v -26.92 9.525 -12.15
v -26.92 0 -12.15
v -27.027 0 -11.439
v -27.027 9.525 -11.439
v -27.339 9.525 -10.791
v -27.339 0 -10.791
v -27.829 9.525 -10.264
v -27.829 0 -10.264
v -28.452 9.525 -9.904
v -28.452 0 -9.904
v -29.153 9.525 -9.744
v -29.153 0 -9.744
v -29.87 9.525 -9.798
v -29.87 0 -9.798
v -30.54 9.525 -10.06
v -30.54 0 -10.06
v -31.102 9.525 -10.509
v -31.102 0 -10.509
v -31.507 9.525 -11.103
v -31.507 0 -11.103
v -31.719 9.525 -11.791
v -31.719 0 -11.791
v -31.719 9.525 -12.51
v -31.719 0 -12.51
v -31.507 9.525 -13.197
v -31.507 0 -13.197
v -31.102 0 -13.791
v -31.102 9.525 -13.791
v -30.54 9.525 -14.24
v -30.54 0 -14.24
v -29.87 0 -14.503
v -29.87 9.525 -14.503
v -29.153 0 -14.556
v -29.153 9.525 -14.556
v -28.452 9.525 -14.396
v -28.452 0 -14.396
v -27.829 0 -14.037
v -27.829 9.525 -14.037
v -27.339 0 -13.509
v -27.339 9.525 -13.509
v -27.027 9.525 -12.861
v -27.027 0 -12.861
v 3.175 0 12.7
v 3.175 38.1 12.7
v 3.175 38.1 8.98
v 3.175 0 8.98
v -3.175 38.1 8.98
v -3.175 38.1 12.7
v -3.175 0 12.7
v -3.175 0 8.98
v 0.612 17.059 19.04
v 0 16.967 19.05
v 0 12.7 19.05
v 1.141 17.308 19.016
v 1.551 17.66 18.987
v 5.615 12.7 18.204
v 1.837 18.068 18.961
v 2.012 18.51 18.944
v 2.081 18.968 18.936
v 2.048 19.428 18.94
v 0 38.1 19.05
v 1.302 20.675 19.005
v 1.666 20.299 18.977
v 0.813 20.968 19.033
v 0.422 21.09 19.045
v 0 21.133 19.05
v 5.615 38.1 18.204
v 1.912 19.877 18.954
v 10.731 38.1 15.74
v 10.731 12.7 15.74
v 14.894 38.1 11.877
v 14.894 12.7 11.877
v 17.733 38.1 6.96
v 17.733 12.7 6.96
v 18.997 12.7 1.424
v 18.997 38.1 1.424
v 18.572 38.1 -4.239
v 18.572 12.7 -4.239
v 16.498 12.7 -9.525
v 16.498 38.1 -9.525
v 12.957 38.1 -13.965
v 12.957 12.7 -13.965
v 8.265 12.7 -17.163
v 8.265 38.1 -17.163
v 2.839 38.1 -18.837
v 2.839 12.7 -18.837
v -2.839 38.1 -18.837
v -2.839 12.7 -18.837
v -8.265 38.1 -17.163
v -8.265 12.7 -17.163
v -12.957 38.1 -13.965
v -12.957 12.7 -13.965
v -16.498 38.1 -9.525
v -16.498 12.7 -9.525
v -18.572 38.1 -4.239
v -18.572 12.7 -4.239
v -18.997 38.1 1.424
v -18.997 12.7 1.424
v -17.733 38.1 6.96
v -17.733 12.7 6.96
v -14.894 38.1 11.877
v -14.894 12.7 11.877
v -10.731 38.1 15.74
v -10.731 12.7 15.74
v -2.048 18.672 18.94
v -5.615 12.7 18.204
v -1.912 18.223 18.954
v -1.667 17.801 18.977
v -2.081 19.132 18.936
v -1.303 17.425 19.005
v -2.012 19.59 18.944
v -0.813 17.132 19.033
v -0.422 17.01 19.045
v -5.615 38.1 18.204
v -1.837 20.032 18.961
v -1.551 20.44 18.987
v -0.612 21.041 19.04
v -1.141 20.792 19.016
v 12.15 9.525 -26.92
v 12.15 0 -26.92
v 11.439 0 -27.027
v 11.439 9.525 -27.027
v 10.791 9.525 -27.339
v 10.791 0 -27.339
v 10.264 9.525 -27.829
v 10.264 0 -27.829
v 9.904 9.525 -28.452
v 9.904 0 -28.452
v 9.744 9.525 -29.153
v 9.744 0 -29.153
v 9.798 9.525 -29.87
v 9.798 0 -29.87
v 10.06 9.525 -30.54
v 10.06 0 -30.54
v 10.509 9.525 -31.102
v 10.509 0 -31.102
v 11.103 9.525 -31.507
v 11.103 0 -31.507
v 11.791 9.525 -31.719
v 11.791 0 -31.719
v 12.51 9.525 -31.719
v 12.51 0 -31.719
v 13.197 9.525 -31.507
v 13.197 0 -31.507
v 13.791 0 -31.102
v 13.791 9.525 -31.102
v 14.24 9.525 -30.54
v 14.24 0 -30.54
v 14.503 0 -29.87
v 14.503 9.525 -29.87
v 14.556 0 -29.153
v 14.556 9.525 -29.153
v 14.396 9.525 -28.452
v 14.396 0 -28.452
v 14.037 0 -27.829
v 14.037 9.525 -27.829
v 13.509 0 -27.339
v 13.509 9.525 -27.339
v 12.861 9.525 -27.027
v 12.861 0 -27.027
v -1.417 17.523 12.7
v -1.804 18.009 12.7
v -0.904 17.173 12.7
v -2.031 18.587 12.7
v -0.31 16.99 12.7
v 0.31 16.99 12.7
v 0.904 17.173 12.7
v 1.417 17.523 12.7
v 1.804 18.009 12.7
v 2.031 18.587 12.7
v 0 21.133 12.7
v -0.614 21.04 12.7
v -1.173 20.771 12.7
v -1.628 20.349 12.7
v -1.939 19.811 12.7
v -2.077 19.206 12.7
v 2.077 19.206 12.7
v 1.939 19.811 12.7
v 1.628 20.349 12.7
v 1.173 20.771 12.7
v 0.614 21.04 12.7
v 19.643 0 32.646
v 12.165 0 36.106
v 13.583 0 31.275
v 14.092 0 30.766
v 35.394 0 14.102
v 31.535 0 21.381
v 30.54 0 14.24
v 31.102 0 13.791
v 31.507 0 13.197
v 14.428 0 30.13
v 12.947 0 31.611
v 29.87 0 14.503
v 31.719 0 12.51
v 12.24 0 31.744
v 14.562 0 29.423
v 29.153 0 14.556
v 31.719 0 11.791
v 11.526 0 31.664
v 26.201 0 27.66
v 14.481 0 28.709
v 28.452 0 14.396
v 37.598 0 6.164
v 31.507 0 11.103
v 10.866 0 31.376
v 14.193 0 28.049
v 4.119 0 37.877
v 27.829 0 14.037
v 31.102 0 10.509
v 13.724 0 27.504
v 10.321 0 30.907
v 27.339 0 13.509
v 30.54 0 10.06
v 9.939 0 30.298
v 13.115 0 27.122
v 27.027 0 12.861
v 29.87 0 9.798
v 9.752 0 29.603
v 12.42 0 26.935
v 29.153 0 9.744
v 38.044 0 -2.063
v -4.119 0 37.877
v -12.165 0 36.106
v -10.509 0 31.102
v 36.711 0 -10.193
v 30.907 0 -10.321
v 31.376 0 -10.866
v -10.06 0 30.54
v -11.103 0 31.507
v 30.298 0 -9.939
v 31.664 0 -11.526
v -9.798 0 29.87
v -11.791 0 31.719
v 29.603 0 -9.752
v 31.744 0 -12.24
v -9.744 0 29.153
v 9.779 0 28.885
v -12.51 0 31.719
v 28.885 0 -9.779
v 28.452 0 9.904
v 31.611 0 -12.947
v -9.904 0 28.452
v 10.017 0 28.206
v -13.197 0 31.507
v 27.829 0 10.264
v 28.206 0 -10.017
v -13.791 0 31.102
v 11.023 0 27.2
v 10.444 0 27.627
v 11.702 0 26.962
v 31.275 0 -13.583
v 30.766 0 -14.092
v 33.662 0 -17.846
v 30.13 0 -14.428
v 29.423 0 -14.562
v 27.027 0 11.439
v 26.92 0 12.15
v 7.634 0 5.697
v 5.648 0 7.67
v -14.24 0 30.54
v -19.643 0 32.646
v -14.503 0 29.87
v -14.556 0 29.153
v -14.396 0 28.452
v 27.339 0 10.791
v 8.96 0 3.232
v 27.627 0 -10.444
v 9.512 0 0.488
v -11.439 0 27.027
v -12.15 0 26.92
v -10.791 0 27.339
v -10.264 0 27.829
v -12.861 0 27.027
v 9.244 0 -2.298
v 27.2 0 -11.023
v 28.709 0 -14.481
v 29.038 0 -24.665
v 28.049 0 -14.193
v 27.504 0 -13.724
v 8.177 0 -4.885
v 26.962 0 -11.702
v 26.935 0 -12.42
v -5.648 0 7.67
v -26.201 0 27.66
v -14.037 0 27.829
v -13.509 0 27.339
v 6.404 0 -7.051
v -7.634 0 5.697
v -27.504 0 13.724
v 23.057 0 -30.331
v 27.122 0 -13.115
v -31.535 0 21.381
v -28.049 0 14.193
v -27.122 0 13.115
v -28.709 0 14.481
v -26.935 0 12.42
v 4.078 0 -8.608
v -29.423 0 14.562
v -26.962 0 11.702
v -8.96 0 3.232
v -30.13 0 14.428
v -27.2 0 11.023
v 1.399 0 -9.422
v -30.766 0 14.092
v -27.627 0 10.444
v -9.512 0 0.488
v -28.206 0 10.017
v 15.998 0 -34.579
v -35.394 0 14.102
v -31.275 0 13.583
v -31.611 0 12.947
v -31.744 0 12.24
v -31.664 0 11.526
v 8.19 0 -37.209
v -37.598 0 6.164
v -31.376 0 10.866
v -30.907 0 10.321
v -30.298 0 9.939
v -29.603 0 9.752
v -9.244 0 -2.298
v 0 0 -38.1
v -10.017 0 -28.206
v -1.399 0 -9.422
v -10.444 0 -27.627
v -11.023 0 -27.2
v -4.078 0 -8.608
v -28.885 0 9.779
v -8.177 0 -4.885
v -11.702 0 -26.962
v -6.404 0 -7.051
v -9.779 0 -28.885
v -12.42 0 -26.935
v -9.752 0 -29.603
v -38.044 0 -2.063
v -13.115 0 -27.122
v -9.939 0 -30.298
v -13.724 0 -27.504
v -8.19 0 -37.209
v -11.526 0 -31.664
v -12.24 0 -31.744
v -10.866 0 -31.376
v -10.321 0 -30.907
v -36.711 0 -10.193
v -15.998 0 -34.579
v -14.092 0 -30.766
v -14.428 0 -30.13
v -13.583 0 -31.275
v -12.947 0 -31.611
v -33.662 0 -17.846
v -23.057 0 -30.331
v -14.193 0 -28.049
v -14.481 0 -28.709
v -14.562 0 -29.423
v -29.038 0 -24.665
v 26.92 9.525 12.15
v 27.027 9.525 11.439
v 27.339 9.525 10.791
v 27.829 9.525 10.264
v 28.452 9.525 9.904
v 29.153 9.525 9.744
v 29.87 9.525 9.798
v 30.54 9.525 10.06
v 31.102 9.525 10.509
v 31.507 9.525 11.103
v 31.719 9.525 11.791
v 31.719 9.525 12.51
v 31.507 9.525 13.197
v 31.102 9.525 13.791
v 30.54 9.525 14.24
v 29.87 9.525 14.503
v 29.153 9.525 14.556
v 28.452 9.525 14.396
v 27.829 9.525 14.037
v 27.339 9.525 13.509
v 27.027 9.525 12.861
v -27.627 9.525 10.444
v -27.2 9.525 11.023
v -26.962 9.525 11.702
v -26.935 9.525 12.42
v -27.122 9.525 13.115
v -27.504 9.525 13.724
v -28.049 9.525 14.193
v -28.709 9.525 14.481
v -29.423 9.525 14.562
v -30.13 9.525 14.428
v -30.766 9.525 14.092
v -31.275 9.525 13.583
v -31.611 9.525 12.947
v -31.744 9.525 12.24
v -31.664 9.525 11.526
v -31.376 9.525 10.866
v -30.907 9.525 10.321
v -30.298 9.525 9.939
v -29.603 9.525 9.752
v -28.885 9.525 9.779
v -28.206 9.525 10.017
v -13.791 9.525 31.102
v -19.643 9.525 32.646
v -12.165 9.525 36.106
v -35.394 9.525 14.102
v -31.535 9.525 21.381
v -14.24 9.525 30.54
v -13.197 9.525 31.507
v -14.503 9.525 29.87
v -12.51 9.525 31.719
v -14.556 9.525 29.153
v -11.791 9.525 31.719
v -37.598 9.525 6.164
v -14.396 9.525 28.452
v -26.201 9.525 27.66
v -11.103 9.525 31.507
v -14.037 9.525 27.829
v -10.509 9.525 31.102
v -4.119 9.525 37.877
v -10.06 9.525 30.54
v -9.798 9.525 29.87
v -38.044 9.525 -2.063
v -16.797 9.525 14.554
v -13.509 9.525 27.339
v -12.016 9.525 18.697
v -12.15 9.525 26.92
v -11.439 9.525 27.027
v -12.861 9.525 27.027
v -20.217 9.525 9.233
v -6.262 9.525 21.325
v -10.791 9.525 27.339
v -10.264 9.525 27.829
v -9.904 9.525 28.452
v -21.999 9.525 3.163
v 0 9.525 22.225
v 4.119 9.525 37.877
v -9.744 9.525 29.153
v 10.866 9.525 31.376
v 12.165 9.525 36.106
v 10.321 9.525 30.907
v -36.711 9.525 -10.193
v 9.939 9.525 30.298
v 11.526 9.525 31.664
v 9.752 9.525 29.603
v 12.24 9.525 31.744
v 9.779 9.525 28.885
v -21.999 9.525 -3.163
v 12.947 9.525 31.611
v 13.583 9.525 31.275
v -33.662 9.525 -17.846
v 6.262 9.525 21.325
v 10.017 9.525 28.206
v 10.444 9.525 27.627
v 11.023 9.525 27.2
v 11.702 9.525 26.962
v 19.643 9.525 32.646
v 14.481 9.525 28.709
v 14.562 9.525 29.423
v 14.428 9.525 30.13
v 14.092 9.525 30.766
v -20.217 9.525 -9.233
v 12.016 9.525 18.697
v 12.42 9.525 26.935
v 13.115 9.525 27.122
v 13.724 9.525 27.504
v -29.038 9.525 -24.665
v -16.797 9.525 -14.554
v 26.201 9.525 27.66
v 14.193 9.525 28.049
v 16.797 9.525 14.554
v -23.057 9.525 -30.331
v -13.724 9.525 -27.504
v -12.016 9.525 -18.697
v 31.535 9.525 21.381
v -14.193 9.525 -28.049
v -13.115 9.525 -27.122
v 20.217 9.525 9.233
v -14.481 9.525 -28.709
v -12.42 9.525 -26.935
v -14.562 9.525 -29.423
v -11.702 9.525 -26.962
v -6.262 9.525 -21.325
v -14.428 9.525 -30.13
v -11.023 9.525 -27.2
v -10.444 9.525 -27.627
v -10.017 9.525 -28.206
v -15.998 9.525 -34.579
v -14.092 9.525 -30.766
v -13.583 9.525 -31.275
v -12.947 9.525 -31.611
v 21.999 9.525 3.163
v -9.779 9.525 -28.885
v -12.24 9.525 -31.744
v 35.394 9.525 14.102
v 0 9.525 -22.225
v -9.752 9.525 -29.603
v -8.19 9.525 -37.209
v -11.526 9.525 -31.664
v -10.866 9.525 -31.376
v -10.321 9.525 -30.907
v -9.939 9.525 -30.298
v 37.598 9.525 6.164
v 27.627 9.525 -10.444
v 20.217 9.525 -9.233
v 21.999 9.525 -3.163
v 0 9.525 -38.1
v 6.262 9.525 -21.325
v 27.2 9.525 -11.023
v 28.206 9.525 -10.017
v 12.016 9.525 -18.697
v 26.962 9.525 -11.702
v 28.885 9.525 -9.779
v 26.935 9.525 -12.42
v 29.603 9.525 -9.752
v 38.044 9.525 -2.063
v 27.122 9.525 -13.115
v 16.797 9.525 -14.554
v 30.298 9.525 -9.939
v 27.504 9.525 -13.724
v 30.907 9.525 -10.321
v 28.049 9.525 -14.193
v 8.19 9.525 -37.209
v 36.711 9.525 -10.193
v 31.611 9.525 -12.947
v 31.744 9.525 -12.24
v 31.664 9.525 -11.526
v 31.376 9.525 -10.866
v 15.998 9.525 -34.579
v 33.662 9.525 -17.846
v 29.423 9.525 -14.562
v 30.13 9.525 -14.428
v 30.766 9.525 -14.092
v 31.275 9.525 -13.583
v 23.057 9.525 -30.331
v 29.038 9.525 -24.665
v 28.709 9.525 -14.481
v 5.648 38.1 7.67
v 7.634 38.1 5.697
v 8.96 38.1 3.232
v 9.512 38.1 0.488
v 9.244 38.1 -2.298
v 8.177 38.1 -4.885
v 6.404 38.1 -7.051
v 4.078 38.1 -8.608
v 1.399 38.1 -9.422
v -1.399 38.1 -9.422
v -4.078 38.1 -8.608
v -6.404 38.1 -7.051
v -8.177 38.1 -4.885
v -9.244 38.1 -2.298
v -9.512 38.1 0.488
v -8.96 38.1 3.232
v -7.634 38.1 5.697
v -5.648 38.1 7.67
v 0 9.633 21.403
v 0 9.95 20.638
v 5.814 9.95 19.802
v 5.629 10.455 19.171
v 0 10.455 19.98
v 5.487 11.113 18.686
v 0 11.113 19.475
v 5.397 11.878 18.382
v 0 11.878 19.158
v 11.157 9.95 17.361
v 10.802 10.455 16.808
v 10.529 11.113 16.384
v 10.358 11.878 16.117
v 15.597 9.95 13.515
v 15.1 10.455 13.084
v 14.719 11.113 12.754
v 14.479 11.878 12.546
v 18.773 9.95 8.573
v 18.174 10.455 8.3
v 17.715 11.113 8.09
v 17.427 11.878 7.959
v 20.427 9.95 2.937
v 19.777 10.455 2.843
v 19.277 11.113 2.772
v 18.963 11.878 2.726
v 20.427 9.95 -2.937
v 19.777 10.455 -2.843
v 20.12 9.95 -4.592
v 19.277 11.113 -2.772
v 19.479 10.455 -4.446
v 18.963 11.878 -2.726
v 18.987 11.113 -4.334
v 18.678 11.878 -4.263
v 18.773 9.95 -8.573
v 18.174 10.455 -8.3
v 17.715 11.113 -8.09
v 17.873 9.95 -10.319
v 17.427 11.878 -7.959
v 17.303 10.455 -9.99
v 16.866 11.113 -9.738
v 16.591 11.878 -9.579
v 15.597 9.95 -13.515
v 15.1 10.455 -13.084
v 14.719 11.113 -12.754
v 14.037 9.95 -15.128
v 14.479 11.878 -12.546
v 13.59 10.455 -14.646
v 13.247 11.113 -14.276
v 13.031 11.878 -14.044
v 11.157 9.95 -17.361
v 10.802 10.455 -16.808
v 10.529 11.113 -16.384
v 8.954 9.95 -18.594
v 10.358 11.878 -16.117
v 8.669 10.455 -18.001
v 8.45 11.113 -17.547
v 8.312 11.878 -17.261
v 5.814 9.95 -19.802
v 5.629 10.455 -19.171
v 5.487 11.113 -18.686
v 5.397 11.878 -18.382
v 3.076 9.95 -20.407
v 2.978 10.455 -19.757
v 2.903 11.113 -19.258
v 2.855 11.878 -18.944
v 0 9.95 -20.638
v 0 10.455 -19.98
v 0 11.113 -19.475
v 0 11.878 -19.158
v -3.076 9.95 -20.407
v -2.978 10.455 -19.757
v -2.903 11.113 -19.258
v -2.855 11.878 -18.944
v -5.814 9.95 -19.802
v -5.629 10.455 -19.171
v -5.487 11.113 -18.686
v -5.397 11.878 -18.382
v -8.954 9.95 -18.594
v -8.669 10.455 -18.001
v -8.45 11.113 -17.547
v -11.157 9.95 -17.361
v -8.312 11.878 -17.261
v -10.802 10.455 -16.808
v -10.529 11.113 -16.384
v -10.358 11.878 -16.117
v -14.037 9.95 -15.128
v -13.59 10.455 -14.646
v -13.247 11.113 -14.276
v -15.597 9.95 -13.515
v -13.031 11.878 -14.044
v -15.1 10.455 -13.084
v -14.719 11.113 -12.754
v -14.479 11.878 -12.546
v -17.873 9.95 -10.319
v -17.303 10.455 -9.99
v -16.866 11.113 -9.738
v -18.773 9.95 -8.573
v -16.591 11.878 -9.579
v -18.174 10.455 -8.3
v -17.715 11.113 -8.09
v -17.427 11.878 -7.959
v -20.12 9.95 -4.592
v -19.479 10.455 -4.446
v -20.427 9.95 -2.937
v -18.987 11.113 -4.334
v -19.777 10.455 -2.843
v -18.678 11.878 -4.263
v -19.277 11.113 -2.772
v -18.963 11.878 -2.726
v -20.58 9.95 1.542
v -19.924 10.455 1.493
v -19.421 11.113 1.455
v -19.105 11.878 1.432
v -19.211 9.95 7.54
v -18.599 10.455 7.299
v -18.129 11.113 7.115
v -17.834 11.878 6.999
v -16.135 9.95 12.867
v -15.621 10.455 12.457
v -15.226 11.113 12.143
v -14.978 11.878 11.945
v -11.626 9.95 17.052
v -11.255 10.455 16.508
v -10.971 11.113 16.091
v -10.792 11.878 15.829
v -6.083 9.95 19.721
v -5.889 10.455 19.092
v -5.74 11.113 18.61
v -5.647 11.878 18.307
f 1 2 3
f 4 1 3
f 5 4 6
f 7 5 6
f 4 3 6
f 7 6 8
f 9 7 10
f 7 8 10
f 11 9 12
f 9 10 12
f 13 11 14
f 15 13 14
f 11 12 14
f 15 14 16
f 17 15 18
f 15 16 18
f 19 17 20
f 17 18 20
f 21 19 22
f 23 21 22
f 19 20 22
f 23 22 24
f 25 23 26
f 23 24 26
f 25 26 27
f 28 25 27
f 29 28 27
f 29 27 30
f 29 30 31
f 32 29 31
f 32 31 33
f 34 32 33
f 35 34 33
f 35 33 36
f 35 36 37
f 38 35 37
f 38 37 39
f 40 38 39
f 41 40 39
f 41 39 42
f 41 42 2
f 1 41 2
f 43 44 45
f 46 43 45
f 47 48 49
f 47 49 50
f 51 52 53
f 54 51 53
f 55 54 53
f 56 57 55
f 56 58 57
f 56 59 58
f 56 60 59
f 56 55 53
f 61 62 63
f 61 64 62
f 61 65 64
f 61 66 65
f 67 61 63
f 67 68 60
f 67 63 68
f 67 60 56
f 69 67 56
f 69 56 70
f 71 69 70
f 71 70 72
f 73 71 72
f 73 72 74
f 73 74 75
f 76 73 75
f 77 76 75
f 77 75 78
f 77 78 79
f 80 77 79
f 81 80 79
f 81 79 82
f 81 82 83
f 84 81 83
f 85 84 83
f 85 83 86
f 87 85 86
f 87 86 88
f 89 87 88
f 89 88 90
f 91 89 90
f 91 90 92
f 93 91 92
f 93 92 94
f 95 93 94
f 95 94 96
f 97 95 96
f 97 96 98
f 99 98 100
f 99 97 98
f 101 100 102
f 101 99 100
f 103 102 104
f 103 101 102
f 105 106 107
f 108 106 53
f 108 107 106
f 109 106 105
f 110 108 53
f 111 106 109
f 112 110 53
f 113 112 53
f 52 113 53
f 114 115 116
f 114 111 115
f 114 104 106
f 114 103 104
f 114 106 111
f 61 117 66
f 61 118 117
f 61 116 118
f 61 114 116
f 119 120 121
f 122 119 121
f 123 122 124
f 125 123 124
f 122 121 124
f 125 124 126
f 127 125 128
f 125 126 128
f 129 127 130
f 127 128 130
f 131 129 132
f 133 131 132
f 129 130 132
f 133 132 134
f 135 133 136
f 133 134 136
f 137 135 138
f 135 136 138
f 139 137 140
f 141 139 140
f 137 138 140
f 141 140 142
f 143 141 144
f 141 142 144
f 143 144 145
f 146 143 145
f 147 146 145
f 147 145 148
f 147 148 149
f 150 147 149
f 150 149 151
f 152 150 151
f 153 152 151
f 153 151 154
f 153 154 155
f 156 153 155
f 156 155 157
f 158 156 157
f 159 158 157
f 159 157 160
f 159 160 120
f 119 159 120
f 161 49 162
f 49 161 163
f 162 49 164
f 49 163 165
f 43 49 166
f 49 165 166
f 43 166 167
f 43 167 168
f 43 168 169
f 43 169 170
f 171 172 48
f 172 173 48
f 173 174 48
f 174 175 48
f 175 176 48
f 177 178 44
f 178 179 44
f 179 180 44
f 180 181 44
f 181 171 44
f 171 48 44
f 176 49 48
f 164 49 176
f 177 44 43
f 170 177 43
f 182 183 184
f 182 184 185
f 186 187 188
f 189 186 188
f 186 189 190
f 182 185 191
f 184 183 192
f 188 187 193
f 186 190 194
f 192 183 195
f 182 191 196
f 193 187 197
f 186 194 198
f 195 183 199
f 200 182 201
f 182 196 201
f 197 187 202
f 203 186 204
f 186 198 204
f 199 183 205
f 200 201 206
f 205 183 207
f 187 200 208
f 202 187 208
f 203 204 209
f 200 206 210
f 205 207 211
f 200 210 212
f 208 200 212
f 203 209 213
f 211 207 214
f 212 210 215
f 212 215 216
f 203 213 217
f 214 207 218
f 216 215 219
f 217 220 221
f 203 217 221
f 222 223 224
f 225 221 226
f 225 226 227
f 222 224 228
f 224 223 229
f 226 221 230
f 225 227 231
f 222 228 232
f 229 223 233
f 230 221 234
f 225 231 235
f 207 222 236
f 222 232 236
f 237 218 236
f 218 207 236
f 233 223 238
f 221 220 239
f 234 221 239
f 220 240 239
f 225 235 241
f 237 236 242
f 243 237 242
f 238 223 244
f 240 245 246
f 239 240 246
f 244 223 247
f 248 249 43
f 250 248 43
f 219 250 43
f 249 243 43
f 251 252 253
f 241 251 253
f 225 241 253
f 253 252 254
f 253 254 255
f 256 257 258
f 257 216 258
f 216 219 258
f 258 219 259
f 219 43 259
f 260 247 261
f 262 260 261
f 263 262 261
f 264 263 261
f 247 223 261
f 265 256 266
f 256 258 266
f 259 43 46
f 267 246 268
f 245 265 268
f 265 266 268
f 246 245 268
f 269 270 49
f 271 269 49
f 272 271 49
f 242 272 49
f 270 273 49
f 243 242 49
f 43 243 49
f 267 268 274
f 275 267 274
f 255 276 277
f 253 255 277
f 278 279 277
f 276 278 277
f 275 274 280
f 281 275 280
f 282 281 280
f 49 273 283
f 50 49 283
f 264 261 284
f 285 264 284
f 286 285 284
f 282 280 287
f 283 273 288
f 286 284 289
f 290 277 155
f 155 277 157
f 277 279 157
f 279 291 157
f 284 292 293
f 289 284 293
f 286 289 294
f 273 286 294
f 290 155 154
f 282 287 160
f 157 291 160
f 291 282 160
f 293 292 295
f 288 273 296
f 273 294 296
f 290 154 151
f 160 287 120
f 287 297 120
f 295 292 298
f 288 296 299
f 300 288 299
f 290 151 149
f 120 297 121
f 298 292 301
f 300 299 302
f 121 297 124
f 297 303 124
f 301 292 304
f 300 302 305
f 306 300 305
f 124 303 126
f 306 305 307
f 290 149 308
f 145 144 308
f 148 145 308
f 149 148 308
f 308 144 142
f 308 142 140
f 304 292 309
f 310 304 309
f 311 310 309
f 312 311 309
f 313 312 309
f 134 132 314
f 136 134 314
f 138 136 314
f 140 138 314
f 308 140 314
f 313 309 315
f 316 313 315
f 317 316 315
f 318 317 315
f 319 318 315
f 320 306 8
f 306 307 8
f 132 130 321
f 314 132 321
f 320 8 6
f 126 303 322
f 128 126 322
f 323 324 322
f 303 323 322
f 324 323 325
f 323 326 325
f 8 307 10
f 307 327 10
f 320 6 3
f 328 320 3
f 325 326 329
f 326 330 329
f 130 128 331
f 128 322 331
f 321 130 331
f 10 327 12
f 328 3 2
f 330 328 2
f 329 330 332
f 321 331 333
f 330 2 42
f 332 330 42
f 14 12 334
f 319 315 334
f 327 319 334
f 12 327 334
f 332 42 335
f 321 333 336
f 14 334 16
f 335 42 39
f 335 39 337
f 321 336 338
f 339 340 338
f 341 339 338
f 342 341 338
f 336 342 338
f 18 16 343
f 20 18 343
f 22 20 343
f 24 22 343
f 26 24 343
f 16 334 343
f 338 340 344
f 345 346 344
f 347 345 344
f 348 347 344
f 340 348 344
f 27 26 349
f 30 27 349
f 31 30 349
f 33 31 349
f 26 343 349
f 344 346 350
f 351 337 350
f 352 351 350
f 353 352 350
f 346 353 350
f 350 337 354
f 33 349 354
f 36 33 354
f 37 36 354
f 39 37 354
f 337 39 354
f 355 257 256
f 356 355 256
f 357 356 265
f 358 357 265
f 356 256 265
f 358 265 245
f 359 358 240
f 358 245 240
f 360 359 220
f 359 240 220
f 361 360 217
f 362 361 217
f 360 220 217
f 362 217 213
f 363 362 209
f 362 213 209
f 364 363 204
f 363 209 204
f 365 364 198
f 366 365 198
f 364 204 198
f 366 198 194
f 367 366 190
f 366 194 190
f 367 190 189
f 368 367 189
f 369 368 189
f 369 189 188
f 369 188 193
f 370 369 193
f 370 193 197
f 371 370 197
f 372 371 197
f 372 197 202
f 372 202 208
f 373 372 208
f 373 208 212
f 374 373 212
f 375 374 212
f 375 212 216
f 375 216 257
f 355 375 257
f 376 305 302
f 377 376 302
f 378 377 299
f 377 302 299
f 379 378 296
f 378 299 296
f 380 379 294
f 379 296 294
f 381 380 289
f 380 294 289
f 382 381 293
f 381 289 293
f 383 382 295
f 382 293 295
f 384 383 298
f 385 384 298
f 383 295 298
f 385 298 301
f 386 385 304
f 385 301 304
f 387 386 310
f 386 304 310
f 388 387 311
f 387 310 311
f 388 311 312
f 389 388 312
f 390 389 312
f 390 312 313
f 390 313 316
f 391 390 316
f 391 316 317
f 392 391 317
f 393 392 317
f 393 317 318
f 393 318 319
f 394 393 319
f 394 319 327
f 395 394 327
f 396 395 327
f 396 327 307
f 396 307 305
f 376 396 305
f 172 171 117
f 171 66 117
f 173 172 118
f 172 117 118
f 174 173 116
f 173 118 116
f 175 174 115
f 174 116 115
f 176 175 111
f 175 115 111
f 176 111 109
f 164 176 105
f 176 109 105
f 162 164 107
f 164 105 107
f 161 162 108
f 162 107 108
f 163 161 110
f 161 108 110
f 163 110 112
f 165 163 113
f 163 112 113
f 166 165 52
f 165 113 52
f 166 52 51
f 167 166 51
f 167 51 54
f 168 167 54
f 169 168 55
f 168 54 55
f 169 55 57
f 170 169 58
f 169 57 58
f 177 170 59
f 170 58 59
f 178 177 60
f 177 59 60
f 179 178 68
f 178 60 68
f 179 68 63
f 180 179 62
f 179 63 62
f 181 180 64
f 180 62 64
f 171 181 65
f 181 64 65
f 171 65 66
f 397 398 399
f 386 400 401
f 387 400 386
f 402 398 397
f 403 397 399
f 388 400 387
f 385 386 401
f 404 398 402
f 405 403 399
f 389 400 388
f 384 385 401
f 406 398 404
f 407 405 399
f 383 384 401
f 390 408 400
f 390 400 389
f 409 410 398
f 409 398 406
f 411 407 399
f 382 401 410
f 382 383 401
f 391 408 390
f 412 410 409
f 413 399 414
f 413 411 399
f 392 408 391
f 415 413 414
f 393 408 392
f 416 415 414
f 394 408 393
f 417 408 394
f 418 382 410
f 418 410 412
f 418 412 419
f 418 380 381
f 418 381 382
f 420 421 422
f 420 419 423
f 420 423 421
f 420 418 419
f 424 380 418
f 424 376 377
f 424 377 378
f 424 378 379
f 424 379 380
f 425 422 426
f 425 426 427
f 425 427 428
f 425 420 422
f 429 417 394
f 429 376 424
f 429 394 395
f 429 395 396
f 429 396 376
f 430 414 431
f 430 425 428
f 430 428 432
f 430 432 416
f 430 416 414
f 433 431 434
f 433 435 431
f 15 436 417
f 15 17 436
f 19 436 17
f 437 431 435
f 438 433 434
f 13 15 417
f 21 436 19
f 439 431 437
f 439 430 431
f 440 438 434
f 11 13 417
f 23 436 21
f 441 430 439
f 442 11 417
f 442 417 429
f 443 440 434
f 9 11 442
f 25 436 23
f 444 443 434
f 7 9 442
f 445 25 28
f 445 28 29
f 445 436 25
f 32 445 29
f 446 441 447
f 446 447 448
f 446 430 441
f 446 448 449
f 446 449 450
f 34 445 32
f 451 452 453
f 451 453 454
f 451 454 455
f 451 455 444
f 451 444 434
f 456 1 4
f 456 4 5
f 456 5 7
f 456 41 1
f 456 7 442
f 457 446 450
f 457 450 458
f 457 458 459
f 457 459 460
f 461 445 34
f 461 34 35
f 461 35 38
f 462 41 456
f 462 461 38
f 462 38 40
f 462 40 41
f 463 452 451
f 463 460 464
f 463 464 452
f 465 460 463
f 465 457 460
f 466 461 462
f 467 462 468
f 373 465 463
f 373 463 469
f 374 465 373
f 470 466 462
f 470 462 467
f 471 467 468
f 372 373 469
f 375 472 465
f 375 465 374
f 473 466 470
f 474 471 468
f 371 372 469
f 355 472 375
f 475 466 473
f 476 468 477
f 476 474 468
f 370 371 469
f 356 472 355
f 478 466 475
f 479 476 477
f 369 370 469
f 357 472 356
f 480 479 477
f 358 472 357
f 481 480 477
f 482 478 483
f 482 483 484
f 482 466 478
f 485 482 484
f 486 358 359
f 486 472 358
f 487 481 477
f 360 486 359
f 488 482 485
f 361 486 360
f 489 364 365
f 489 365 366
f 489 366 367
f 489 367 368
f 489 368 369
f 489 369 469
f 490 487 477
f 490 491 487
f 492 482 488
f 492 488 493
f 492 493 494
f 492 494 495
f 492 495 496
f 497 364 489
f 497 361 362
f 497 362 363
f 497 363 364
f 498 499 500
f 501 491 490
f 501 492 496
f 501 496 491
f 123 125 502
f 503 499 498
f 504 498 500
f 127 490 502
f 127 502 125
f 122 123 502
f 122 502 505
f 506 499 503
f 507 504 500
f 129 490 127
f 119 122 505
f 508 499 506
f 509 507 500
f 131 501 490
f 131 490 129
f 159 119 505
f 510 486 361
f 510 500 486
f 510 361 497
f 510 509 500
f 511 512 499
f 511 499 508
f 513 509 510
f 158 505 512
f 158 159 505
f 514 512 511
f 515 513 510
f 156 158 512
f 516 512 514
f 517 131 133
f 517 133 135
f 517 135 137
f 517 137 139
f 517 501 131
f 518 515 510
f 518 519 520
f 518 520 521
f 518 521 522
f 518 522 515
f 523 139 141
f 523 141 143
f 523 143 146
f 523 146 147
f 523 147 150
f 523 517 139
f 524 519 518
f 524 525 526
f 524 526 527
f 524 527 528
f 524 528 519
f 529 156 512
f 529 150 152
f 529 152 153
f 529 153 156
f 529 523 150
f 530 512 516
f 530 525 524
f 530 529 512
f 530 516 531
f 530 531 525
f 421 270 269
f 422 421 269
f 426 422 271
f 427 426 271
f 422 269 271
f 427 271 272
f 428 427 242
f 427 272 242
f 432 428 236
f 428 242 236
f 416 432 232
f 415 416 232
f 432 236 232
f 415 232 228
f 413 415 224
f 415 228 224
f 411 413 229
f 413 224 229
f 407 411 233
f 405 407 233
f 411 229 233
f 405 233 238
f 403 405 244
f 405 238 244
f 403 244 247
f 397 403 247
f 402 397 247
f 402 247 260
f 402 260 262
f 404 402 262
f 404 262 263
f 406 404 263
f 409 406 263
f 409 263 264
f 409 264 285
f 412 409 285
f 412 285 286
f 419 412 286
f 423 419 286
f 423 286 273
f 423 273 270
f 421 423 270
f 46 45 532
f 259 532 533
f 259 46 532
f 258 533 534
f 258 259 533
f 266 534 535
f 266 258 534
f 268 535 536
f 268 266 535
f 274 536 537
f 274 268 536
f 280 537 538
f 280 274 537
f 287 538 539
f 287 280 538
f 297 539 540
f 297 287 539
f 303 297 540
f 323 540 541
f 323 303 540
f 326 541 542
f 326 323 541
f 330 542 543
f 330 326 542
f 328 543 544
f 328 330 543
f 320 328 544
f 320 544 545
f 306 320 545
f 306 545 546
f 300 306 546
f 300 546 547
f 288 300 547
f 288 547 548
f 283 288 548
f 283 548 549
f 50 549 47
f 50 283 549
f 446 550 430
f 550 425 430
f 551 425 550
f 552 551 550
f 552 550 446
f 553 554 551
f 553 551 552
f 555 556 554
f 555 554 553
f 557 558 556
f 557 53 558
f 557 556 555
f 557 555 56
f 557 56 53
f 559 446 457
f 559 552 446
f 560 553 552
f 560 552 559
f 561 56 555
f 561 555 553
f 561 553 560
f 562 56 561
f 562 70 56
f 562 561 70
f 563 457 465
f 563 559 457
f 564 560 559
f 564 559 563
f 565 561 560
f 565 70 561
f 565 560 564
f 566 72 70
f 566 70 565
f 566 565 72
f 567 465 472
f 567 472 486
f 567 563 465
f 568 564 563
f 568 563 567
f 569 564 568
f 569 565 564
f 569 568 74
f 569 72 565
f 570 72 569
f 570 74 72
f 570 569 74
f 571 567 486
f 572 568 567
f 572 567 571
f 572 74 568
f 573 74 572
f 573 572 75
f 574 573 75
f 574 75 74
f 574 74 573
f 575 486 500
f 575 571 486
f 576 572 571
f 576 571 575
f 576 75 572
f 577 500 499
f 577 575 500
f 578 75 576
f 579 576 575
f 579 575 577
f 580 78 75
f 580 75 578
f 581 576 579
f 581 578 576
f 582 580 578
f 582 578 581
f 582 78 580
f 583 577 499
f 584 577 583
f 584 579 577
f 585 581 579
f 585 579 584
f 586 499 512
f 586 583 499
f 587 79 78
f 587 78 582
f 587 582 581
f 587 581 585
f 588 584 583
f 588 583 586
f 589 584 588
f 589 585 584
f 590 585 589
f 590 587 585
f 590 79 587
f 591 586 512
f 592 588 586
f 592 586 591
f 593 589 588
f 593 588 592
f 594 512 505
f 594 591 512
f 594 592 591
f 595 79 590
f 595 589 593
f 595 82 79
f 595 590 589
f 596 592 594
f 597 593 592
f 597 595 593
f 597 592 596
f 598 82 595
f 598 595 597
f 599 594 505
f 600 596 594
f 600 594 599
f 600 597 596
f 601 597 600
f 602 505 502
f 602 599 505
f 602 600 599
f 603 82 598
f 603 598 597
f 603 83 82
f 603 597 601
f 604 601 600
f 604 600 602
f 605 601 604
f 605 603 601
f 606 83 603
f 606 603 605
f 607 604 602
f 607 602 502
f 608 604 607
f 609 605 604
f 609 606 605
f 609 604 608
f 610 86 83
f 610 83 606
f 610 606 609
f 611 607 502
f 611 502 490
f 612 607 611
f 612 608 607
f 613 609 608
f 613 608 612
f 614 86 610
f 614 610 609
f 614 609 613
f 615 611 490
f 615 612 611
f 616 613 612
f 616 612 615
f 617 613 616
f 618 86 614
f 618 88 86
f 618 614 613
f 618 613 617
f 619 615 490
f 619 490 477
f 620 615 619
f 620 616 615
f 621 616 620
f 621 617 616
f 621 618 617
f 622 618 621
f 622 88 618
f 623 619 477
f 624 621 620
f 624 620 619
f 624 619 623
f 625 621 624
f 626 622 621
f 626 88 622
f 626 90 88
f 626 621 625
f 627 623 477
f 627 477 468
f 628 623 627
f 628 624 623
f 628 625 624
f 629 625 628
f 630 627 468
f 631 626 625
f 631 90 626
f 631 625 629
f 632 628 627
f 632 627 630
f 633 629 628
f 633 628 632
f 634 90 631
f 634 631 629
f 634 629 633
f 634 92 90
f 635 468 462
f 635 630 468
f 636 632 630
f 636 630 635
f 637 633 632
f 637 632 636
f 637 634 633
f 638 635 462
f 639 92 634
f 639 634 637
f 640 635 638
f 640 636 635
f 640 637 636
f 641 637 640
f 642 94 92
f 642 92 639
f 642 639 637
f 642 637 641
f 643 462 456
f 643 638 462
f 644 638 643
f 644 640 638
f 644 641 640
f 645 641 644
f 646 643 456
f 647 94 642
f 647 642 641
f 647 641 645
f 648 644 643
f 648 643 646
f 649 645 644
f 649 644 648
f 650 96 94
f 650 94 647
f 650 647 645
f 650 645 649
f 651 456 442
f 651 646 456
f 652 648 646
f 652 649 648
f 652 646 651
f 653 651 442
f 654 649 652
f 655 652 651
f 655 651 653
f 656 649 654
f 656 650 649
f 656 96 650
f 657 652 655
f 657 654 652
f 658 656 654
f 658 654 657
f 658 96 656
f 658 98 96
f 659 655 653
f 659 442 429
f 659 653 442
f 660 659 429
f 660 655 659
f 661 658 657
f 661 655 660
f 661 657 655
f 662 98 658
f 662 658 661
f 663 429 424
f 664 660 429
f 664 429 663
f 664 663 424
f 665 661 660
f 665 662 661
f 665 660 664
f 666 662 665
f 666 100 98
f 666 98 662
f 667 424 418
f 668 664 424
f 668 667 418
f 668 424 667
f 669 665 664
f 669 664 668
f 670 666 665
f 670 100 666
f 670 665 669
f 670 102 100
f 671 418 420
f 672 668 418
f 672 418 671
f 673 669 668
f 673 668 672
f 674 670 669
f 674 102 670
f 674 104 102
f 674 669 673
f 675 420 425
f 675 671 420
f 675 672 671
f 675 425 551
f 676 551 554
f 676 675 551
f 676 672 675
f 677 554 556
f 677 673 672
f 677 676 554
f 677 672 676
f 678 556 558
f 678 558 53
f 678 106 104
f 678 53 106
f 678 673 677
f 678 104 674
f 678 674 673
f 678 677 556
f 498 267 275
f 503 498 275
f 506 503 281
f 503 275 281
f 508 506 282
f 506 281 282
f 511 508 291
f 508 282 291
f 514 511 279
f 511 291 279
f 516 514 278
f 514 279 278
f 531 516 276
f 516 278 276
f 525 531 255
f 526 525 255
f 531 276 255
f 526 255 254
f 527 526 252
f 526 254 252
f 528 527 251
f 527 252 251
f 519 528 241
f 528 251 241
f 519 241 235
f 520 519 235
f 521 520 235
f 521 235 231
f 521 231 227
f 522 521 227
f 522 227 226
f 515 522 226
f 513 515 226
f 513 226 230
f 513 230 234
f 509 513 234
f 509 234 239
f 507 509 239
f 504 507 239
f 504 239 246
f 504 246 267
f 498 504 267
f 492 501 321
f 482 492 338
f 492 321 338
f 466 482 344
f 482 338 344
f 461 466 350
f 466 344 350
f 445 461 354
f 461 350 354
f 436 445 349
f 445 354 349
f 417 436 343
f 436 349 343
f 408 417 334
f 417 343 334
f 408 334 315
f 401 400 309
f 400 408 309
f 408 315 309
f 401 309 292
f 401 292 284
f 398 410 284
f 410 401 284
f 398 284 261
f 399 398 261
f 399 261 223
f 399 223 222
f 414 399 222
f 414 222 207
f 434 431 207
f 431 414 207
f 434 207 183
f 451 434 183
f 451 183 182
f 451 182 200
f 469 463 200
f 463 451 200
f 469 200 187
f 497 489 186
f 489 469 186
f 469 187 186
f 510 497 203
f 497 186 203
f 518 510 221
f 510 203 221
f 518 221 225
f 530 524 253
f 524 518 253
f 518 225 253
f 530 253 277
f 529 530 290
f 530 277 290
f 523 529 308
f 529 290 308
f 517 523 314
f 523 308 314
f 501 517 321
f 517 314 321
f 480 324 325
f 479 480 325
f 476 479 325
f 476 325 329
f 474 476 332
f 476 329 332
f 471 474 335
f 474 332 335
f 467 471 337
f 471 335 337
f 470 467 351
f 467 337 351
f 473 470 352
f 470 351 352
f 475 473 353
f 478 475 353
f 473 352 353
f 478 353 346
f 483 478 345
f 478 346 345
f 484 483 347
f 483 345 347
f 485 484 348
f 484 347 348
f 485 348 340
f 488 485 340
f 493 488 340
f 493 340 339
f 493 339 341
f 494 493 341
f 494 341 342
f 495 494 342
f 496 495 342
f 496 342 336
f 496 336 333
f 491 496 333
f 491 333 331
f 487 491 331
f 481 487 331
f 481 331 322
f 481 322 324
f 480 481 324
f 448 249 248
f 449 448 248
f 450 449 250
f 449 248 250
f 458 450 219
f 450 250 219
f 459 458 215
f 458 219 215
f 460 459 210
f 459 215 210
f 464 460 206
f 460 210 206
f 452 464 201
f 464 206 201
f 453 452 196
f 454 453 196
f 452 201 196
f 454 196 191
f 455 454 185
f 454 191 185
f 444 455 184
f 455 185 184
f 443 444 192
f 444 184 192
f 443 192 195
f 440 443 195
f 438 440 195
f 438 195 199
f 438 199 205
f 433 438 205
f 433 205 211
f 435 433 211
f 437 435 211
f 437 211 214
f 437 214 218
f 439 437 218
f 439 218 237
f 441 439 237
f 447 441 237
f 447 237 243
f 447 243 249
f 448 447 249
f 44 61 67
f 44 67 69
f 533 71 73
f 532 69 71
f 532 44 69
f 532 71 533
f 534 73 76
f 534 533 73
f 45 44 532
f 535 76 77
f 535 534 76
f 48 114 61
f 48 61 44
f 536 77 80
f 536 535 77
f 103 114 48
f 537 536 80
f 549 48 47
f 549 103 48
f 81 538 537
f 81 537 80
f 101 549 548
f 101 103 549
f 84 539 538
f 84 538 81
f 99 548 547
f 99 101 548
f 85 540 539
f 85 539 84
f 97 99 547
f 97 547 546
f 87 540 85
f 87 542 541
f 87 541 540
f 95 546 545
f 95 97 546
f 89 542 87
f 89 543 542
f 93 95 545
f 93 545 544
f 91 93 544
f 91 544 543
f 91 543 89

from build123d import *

# Parameters (mm, degrees)
SKETCH1_R              = 38.1
SKETCH1_R_2            = 9.525
BOSS_EXTRUDE1_DEPTH    = 38.1
F_10_32_TAPPED_HOLE1_D = 4.826
CIRPATTERN1_COUNT      = 8
SKETCH4_W              = 6.35
SKETCH4_H              = 6.35
CUT_EXTRUDE1_DEPTH     = 66.991135768
SKETCH5_W              = 2.0828
SKETCH5_H              = 25.4
SKETCH7_OUTSIDE_W      = 101.06
SKETCH7_OUTSIDE_H      = 101.06
SKETCH7_OUTSIDE_R      = 19.05
CUT_EXTRUDE2_DEPTH     = 28.575
FILLET1_R              = 3.175


with BuildPart() as part:
    # Sketch1 → Boss-Extrude1 (new body)
    with BuildSketch(Plane(origin=(0, 0, 0), x_dir=(1, 0, 0), z_dir=(0, 1, 0))):
        with Locations(Location((0, 0, 0), (0, 0, 90))):
            Circle(SKETCH1_R)
        with Locations(Location((0, 0, 0), (0, 0, 90))):
            Circle(SKETCH1_R_2, mode=Mode.SUBTRACT)
    extrude(amount=BOSS_EXTRUDE1_DEPTH)

    # #10-32 Tapped Hole1 (through all)
    with Locations(Plane(origin=(0, 38.1, 0), x_dir=(-1, 0, 0), z_dir=(0, 1, 0))):
        with Locations((29.333175157, -12.150198978)):
            f_10_32_tapped_hole1 = Hole(F_10_32_TAPPED_HOLE1_D / 2)

    # CirPattern1: #10-32 Tapped Hole1 ×8 about axis
    cirpattern1_axis = Axis((0, 0, 0), (0, 1, 0))
    for i in range(1, CIRPATTERN1_COUNT):
        add(f_10_32_tapped_hole1.rotate(cirpattern1_axis, i * 360 / CIRPATTERN1_COUNT), mode=Mode.SUBTRACT)

    # Sketch4 → Cut-Extrude1 (cut, through all)
    with BuildSketch(Plane(origin=(0, 38.1, 0), x_dir=(1, 0, 0), z_dir=(0, 1, 0))):
        with Locations((0, -9.525)):
            Rectangle(SKETCH4_W, SKETCH4_H)
    extrude(amount=-CUT_EXTRUDE1_DEPTH, mode=Mode.SUBTRACT)

    # Sketch5 → #8-32 Tapped Hole1 (revolve, cut)
    with BuildSketch(Plane(origin=(0, 19.05, 12.7), x_dir=(0, 1, 0), z_dir=(1, 0, 0))):
        with Locations((1.0414, 12.7)):
            Rectangle(SKETCH5_W, SKETCH5_H)
    revolve(axis=Axis((0, 19.05, 6.35), (0, 0, 1)), mode=Mode.SUBTRACT)

    # Sketch7 outside → Cut-Extrude2 (cut)
    with BuildSketch(Plane(origin=(0, 38.1, 0), x_dir=(1, 0, 0), z_dir=(0, 1, 0))):
        Rectangle(SKETCH7_OUTSIDE_W, SKETCH7_OUTSIDE_H)
        with Locations(Location((0, 0, 0), (0, 0, 270))):
            Circle(SKETCH7_OUTSIDE_R, mode=Mode.SUBTRACT)
    extrude(amount=-CUT_EXTRUDE2_DEPTH, mode=Mode.SUBTRACT)

    # Fillet1
    fillet1_edges = [part.edges().sort_by_distance(p)[0] for p in [
        (0, 9.525, -19.05),
    ]]
    fillet(fillet1_edges, radius=FILLET1_R)


solid = part.part
